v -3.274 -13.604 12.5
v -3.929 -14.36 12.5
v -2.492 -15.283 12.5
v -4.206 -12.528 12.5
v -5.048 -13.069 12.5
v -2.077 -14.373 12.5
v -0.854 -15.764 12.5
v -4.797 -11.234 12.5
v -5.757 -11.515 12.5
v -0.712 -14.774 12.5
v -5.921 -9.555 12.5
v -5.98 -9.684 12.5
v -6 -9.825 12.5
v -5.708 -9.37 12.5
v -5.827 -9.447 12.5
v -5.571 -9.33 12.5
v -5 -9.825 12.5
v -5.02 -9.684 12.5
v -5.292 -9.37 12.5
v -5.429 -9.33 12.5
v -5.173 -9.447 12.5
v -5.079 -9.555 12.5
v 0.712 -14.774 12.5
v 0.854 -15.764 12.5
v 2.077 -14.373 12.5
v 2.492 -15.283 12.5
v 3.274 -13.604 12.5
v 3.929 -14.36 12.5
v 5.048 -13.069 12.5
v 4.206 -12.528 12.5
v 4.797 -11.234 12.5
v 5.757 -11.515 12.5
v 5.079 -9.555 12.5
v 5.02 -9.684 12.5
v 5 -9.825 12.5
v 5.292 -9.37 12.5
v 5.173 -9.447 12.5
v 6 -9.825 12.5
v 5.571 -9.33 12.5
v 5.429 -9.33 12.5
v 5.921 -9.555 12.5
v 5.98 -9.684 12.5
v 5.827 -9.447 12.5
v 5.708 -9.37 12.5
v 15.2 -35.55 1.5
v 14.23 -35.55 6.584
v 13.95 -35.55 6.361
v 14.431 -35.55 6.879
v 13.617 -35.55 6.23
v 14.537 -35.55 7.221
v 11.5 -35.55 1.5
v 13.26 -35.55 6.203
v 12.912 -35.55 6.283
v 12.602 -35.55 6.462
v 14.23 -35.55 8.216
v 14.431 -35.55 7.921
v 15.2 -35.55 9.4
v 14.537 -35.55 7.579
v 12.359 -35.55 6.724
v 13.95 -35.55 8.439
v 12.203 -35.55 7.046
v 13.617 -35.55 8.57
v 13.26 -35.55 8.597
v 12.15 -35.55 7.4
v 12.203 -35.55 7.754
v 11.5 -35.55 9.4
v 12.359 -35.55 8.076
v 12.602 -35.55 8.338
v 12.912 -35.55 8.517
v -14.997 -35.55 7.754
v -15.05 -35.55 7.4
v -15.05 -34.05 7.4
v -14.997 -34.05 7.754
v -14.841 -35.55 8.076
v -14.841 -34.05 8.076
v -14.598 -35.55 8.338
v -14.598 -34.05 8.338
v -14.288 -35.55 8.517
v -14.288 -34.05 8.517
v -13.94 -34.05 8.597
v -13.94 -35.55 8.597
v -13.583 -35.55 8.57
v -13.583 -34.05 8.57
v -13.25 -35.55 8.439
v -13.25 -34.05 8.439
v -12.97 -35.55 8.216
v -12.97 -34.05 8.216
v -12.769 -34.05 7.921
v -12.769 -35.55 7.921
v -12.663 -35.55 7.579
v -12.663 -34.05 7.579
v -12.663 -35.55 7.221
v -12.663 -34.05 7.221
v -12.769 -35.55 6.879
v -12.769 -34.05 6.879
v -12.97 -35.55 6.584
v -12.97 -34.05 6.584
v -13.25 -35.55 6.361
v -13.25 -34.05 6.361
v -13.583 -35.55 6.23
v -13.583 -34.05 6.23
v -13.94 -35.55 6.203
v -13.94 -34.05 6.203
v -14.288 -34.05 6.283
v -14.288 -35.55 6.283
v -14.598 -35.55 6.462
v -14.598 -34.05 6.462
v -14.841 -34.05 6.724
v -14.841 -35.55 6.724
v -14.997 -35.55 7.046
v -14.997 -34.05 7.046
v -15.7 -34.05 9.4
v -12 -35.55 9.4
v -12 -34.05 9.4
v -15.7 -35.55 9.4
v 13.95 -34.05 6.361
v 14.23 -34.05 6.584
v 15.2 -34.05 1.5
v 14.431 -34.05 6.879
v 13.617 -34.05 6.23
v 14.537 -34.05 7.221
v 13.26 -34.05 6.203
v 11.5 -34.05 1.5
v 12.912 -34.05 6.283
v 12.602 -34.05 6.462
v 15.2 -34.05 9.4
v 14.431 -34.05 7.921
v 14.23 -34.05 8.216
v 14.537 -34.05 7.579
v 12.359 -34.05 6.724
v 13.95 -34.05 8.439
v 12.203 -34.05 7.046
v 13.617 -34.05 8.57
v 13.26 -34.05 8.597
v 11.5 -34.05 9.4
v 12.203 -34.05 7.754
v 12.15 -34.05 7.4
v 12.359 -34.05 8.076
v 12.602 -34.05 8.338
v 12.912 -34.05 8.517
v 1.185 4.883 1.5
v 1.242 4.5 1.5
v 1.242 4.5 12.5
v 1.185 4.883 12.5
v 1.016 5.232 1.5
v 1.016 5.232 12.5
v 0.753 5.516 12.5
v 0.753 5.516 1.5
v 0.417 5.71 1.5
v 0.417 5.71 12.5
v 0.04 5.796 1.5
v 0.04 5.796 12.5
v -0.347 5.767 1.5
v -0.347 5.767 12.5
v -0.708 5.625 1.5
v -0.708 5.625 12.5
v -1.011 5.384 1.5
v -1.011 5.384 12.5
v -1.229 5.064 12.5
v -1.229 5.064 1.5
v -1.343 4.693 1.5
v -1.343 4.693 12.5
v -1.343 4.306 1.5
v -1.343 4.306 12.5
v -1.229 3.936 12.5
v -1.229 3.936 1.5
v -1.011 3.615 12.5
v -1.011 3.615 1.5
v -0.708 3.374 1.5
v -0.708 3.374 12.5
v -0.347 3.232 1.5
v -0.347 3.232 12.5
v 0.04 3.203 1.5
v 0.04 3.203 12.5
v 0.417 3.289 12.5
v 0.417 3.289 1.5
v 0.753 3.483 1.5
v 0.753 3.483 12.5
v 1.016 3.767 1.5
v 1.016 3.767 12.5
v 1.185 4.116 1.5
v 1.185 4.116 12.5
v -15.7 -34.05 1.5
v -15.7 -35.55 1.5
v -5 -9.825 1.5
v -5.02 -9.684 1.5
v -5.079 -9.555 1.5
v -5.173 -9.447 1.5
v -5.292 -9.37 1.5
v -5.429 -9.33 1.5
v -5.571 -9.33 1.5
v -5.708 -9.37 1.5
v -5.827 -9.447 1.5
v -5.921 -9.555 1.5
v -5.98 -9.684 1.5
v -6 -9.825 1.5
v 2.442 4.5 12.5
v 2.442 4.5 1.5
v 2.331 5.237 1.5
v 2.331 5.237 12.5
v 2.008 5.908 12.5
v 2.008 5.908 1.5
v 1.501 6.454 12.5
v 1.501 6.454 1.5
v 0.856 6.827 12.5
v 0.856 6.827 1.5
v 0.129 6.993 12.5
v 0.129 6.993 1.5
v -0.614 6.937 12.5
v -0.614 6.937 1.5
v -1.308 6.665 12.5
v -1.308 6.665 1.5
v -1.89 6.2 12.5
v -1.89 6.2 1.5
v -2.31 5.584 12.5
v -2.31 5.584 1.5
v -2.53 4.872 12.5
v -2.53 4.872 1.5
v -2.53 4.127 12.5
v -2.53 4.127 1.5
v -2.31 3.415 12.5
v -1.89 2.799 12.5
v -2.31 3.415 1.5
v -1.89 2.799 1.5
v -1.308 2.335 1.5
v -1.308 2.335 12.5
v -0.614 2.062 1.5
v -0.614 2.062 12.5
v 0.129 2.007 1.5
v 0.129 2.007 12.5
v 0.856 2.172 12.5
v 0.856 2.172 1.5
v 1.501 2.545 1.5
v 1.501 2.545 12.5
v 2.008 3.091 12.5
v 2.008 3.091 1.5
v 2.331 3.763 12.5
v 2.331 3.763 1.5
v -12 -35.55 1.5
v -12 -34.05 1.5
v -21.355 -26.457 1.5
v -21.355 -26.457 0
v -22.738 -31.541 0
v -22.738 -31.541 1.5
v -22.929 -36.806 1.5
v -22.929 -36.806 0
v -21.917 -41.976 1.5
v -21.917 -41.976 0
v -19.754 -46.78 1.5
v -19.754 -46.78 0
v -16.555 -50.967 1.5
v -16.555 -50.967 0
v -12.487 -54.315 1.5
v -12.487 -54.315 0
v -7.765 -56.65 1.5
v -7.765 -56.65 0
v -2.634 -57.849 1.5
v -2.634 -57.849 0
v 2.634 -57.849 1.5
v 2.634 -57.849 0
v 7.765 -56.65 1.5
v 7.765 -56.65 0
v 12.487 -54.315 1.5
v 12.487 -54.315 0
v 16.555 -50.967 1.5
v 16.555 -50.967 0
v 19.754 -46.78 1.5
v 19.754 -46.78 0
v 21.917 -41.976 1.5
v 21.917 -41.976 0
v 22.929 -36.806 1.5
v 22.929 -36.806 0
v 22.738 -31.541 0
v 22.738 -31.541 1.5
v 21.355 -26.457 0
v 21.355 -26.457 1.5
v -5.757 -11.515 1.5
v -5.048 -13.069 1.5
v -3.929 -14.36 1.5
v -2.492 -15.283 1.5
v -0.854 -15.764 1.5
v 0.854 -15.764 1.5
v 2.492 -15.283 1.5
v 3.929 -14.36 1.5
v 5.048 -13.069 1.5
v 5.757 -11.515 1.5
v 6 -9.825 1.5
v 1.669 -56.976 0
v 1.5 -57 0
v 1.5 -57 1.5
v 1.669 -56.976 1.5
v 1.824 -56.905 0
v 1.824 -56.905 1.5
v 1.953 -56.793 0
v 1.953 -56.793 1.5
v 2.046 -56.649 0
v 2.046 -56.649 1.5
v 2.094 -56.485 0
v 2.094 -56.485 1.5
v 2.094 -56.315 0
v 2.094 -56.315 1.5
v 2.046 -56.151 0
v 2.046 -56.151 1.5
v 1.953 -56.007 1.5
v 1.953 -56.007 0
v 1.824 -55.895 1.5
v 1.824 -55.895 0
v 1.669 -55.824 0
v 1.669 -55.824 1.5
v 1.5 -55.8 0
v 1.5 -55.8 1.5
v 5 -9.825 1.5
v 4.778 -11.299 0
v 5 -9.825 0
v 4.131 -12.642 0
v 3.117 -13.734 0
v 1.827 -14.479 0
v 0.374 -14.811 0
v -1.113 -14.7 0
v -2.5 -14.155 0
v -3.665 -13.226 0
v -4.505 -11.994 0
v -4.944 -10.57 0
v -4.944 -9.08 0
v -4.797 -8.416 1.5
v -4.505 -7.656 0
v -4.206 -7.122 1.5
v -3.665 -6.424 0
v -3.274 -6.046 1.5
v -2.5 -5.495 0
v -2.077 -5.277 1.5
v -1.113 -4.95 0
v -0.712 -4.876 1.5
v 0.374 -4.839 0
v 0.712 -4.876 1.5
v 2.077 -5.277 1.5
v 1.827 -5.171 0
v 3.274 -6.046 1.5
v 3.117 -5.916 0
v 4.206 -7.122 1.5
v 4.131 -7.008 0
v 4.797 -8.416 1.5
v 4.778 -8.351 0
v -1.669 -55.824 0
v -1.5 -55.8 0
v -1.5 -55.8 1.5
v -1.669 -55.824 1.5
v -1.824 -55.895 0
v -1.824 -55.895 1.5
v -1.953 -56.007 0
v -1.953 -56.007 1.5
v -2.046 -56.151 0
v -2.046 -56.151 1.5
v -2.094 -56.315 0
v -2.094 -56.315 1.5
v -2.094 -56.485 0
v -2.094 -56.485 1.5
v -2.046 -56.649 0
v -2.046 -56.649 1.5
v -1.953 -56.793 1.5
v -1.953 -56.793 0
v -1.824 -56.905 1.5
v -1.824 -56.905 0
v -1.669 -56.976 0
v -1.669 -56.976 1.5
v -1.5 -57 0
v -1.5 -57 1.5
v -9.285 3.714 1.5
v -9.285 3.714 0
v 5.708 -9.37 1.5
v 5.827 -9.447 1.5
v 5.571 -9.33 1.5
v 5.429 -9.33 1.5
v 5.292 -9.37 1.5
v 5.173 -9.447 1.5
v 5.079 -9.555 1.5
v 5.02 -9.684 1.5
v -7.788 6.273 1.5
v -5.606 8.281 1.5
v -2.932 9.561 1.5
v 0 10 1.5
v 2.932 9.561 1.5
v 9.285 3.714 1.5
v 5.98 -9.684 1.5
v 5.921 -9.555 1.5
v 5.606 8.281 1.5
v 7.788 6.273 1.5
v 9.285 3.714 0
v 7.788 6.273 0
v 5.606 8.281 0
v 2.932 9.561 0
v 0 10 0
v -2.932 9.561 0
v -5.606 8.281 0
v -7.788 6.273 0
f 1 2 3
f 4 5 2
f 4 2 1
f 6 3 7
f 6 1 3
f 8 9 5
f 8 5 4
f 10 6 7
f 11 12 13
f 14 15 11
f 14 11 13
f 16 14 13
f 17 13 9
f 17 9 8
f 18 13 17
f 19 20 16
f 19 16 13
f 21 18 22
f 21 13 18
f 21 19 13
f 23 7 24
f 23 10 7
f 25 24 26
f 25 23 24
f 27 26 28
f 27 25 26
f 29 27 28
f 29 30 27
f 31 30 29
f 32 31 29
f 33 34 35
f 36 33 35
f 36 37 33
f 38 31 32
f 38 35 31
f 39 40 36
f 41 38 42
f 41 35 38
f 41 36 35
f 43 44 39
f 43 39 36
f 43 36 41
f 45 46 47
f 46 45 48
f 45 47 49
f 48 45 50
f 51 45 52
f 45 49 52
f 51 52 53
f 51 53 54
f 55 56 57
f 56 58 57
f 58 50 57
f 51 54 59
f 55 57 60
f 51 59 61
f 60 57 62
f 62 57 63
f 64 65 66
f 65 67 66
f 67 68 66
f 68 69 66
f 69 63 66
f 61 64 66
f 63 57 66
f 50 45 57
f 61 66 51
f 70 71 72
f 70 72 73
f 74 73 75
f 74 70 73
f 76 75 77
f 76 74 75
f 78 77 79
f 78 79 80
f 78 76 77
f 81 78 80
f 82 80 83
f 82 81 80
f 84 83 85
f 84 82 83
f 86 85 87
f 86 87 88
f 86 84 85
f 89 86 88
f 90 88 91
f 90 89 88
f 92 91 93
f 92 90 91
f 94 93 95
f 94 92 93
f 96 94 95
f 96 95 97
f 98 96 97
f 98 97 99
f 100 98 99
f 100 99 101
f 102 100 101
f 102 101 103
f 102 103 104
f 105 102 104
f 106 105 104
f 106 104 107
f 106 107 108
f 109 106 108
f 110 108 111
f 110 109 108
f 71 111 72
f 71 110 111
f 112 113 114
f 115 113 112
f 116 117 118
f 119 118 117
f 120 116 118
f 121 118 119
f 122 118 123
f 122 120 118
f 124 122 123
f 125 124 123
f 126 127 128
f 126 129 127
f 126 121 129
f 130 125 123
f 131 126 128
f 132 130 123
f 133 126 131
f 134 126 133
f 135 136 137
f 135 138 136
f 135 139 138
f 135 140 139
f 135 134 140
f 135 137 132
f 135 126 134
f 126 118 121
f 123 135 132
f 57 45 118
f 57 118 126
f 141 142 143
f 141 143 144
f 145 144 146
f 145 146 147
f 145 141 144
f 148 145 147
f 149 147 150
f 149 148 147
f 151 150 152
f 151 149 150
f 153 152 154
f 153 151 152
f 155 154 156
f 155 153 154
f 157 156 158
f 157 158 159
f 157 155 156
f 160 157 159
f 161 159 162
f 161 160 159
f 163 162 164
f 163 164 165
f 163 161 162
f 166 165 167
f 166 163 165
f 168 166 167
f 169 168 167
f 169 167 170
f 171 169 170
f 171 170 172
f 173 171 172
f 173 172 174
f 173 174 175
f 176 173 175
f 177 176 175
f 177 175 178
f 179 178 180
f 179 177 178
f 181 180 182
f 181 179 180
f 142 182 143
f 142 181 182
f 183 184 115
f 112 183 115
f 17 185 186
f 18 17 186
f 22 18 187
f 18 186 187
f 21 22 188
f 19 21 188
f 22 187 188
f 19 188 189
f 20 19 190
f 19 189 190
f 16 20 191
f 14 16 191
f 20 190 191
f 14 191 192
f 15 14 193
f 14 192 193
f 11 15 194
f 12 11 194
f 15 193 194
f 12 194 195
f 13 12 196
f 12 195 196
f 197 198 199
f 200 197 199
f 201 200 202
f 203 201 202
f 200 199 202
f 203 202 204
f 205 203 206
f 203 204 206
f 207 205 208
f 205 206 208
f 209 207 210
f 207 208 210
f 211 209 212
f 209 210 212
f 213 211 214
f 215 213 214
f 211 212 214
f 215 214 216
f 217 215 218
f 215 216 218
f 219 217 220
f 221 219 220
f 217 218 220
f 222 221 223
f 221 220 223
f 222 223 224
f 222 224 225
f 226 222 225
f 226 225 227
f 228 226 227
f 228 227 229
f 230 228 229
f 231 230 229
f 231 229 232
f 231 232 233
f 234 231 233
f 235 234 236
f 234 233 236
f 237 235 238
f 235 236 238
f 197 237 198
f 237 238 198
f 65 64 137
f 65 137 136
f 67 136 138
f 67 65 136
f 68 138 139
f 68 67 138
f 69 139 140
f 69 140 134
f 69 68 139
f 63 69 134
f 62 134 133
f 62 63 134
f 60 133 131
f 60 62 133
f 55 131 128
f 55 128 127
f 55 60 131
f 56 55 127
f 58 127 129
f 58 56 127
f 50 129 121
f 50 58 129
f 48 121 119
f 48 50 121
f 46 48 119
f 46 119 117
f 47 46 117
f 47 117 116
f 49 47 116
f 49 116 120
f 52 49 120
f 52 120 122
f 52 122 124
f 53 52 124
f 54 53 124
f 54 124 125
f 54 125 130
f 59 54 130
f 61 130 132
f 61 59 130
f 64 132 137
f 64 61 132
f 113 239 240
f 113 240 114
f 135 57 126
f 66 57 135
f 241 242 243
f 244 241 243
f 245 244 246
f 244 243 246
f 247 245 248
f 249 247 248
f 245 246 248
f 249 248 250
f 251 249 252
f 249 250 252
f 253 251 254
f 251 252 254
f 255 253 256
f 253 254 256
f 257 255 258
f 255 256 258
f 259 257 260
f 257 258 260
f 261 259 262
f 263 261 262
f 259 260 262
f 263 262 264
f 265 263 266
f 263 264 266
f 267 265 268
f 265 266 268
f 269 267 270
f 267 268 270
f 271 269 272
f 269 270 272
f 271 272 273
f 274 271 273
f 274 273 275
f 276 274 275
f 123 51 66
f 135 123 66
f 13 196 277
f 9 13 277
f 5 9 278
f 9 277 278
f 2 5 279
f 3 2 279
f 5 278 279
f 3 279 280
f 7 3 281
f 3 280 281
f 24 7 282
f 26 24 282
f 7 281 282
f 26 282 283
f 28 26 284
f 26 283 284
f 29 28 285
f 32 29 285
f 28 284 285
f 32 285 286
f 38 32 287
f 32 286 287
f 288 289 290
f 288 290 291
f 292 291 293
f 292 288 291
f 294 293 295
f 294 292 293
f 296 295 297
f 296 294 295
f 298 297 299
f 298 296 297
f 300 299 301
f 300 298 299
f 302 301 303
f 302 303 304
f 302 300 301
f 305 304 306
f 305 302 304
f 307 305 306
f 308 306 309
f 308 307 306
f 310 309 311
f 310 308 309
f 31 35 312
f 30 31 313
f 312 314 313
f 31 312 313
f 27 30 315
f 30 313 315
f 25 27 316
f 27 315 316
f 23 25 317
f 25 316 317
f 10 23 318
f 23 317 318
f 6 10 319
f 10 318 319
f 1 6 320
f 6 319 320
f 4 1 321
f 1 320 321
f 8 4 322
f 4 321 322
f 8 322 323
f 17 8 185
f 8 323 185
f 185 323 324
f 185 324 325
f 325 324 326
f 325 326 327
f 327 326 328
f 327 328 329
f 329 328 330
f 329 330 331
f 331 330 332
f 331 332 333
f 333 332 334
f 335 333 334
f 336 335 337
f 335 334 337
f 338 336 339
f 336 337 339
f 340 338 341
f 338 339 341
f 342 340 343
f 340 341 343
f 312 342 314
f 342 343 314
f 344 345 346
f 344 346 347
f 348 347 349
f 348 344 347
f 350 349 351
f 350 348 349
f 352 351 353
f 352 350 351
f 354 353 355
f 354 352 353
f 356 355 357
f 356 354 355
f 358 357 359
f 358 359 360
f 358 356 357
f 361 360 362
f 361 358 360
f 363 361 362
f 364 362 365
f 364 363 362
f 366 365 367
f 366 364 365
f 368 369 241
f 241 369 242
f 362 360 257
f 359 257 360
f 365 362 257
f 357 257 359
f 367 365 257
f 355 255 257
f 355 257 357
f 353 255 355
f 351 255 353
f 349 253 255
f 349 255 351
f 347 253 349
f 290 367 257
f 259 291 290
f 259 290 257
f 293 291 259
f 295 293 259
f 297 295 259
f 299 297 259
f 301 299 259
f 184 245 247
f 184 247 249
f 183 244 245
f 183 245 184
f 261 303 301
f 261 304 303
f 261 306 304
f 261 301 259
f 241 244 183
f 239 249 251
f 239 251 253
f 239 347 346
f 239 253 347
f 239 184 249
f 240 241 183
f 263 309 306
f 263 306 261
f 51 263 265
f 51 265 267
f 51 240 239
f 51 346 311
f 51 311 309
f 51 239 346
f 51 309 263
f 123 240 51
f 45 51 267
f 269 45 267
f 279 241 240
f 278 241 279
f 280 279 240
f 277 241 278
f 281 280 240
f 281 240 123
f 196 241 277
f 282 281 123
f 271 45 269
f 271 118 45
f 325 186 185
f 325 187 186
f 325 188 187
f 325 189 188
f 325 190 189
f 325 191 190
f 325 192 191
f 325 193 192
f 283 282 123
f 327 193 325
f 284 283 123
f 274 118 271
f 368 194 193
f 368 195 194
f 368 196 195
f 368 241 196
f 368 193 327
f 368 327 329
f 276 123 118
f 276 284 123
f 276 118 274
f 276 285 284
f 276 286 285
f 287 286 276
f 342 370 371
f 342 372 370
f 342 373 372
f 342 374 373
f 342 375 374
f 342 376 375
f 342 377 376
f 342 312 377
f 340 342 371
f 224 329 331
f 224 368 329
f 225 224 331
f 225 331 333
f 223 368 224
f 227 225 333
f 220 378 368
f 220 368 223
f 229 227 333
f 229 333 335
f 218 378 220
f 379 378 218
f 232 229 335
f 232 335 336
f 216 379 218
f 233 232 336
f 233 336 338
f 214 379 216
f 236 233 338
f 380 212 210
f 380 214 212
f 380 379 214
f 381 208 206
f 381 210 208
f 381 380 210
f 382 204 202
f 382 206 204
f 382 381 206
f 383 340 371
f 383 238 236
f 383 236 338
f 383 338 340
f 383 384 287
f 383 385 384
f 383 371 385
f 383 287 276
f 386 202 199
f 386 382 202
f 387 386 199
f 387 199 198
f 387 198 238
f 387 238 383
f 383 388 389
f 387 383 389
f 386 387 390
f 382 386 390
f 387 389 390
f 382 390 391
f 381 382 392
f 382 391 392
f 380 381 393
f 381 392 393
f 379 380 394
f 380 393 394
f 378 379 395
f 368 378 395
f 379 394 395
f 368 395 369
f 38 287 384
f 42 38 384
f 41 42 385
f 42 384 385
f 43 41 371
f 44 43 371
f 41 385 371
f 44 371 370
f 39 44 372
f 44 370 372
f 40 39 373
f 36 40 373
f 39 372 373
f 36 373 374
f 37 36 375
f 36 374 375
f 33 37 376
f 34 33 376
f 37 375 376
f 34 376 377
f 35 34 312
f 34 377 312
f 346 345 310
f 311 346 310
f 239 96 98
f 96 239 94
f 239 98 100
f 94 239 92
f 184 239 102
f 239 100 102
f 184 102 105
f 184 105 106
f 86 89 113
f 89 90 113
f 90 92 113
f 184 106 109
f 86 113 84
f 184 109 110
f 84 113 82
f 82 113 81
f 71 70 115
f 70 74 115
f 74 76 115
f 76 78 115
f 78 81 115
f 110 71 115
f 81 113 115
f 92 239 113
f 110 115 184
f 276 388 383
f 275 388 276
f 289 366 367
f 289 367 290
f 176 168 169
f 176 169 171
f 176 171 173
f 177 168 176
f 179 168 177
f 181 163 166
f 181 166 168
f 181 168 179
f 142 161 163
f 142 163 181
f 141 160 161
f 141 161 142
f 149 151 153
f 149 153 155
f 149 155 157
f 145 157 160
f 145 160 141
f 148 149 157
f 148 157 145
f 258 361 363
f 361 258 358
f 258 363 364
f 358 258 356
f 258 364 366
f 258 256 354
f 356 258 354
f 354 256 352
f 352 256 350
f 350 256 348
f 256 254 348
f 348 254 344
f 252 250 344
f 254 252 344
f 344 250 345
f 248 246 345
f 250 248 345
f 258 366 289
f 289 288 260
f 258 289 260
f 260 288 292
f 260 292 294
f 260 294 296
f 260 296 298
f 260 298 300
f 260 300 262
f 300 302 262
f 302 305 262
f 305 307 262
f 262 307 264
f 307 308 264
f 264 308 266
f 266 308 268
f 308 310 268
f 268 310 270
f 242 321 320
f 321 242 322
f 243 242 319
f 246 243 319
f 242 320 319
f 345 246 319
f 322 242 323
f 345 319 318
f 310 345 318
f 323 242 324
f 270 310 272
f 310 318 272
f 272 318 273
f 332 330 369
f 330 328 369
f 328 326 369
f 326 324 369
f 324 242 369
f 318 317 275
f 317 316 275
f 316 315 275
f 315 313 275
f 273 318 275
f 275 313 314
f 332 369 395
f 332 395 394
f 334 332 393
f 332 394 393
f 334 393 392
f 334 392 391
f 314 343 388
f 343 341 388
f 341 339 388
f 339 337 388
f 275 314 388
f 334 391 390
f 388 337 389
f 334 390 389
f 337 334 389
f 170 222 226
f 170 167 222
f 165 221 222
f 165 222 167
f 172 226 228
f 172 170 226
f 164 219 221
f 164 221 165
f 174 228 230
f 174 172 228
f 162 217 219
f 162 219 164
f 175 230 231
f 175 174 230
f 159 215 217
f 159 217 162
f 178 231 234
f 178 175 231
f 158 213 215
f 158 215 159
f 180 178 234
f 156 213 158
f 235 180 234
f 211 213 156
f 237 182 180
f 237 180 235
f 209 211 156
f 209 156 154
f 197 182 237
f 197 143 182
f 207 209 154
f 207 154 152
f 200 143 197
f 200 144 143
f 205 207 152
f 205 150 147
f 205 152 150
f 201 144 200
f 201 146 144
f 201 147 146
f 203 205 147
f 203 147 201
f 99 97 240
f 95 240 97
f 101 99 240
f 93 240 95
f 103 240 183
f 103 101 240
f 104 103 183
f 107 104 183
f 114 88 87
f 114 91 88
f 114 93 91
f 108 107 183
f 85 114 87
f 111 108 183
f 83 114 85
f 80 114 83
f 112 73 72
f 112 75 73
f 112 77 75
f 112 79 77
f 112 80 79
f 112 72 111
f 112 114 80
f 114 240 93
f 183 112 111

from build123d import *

# Parameters (mm, degrees)
PAD018_DEPTH    = 1.5
SKETCH025_R     = 2.5
SKETCH025_R_2   = 1.3
PAD019_DEPTH    = 11
SKETCH030_R     = 5
POCKET010_DEPTH = 5
PAD022_DEPTH    = 11
SKETCH032_W     = 3.7
SKETCH032_H     = 7.9
SKETCH032_R     = 1.2
PAD023_DEPTH    = 1.5


with BuildPart() as part:
    # Sketch024 (on XY_Plane011 of Origin022) → Pad018 (new body)
    with BuildSketch(Plane.XY):
        with BuildLine():
            ThreePointArc((9.284615, 3.714286), (0, 10), (-9.284615, 3.714286))
            Line((-9.284615, 3.714286), (-21.354615, -26.457143))
            ThreePointArc((-21.354615, -26.457143), (0, -58), (21.354615, -26.457143))
            Line((9.284615, 3.714286), (21.354615, -26.457143))
        make_face()
        with BuildLine():
            ThreePointArc((-1.5, -55.8), (-2.1, -56.4), (-1.5, -57))
            Line((-1.5, -57), (1.5, -57))
            ThreePointArc((1.5, -57), (2.1, -56.4), (1.5, -55.8))
            Line((-1.5, -55.8), (1.5, -55.8))
        make_face(mode=Mode.SUBTRACT)
    extrude(amount=PAD018_DEPTH)

    # Sketch025 (on Face10 of Pad018) → Pad019 (join)
    with BuildSketch(Plane.XY.offset(1.5)):
        with Locations((-0.057612, 4.499631)):
            Circle(SKETCH025_R)
        with Locations((-0.057612, 4.499631)):
            Circle(SKETCH025_R_2, mode=Mode.SUBTRACT)
    extrude(amount=PAD019_DEPTH)

    # Sketch030 (on Face5 of Pad021) → Pocket010 (cut)
    with BuildSketch(Plane.XY.offset(1.5)):
        with Locations((0, -9.825034)):
            Circle(SKETCH030_R)
    extrude(amount=-POCKET010_DEPTH, mode=Mode.SUBTRACT)

    # Sketch031 (on Face5 of Pocket010) → Pad022 (join)
    with BuildSketch(Plane.XY.offset(1.5)):
        with BuildLine():
            ThreePointArc((-6, -9.825034), (0, -15.825034), (6, -9.825034))
            ThreePointArc((6, -9.825034), (5.5, -9.325034), (5, -9.825034))
            ThreePointArc((-5, -9.825034), (0, -14.825034), (5, -9.825034))
            ThreePointArc((-5, -9.825034), (-5.5, -9.325034), (-6, -9.825034))
        make_face()
    pad022 = extrude(amount=PAD022_DEPTH)

    # Mirrored003: Pad022 across Sketch031 V_Axis
    add(pad022.mirror(Plane(origin=(0, 0, 1.5), x_dir=(0, 0, 1), z_dir=(1, 0, 0))))

    # Sketch032 (on Face2 of Binder008) → Pad023 (join)
    with BuildSketch(Plane(origin=(0, -35.550008, 0), x_dir=(-1, 0, 0), z_dir=(0, 1, 0))):
        with Locations((-13.35, 5.45)):
            Rectangle(SKETCH032_W, SKETCH032_H)
        with Locations((-13.35, 7.4)):
            Circle(SKETCH032_R, mode=Mode.SUBTRACT)
        with Locations((13.85, 5.45)):
            Rectangle(SKETCH032_W, SKETCH032_H)
        with Locations((13.85, 7.4)):
            Circle(SKETCH032_R, mode=Mode.SUBTRACT)
    extrude(amount=PAD023_DEPTH)


solid = part.part
